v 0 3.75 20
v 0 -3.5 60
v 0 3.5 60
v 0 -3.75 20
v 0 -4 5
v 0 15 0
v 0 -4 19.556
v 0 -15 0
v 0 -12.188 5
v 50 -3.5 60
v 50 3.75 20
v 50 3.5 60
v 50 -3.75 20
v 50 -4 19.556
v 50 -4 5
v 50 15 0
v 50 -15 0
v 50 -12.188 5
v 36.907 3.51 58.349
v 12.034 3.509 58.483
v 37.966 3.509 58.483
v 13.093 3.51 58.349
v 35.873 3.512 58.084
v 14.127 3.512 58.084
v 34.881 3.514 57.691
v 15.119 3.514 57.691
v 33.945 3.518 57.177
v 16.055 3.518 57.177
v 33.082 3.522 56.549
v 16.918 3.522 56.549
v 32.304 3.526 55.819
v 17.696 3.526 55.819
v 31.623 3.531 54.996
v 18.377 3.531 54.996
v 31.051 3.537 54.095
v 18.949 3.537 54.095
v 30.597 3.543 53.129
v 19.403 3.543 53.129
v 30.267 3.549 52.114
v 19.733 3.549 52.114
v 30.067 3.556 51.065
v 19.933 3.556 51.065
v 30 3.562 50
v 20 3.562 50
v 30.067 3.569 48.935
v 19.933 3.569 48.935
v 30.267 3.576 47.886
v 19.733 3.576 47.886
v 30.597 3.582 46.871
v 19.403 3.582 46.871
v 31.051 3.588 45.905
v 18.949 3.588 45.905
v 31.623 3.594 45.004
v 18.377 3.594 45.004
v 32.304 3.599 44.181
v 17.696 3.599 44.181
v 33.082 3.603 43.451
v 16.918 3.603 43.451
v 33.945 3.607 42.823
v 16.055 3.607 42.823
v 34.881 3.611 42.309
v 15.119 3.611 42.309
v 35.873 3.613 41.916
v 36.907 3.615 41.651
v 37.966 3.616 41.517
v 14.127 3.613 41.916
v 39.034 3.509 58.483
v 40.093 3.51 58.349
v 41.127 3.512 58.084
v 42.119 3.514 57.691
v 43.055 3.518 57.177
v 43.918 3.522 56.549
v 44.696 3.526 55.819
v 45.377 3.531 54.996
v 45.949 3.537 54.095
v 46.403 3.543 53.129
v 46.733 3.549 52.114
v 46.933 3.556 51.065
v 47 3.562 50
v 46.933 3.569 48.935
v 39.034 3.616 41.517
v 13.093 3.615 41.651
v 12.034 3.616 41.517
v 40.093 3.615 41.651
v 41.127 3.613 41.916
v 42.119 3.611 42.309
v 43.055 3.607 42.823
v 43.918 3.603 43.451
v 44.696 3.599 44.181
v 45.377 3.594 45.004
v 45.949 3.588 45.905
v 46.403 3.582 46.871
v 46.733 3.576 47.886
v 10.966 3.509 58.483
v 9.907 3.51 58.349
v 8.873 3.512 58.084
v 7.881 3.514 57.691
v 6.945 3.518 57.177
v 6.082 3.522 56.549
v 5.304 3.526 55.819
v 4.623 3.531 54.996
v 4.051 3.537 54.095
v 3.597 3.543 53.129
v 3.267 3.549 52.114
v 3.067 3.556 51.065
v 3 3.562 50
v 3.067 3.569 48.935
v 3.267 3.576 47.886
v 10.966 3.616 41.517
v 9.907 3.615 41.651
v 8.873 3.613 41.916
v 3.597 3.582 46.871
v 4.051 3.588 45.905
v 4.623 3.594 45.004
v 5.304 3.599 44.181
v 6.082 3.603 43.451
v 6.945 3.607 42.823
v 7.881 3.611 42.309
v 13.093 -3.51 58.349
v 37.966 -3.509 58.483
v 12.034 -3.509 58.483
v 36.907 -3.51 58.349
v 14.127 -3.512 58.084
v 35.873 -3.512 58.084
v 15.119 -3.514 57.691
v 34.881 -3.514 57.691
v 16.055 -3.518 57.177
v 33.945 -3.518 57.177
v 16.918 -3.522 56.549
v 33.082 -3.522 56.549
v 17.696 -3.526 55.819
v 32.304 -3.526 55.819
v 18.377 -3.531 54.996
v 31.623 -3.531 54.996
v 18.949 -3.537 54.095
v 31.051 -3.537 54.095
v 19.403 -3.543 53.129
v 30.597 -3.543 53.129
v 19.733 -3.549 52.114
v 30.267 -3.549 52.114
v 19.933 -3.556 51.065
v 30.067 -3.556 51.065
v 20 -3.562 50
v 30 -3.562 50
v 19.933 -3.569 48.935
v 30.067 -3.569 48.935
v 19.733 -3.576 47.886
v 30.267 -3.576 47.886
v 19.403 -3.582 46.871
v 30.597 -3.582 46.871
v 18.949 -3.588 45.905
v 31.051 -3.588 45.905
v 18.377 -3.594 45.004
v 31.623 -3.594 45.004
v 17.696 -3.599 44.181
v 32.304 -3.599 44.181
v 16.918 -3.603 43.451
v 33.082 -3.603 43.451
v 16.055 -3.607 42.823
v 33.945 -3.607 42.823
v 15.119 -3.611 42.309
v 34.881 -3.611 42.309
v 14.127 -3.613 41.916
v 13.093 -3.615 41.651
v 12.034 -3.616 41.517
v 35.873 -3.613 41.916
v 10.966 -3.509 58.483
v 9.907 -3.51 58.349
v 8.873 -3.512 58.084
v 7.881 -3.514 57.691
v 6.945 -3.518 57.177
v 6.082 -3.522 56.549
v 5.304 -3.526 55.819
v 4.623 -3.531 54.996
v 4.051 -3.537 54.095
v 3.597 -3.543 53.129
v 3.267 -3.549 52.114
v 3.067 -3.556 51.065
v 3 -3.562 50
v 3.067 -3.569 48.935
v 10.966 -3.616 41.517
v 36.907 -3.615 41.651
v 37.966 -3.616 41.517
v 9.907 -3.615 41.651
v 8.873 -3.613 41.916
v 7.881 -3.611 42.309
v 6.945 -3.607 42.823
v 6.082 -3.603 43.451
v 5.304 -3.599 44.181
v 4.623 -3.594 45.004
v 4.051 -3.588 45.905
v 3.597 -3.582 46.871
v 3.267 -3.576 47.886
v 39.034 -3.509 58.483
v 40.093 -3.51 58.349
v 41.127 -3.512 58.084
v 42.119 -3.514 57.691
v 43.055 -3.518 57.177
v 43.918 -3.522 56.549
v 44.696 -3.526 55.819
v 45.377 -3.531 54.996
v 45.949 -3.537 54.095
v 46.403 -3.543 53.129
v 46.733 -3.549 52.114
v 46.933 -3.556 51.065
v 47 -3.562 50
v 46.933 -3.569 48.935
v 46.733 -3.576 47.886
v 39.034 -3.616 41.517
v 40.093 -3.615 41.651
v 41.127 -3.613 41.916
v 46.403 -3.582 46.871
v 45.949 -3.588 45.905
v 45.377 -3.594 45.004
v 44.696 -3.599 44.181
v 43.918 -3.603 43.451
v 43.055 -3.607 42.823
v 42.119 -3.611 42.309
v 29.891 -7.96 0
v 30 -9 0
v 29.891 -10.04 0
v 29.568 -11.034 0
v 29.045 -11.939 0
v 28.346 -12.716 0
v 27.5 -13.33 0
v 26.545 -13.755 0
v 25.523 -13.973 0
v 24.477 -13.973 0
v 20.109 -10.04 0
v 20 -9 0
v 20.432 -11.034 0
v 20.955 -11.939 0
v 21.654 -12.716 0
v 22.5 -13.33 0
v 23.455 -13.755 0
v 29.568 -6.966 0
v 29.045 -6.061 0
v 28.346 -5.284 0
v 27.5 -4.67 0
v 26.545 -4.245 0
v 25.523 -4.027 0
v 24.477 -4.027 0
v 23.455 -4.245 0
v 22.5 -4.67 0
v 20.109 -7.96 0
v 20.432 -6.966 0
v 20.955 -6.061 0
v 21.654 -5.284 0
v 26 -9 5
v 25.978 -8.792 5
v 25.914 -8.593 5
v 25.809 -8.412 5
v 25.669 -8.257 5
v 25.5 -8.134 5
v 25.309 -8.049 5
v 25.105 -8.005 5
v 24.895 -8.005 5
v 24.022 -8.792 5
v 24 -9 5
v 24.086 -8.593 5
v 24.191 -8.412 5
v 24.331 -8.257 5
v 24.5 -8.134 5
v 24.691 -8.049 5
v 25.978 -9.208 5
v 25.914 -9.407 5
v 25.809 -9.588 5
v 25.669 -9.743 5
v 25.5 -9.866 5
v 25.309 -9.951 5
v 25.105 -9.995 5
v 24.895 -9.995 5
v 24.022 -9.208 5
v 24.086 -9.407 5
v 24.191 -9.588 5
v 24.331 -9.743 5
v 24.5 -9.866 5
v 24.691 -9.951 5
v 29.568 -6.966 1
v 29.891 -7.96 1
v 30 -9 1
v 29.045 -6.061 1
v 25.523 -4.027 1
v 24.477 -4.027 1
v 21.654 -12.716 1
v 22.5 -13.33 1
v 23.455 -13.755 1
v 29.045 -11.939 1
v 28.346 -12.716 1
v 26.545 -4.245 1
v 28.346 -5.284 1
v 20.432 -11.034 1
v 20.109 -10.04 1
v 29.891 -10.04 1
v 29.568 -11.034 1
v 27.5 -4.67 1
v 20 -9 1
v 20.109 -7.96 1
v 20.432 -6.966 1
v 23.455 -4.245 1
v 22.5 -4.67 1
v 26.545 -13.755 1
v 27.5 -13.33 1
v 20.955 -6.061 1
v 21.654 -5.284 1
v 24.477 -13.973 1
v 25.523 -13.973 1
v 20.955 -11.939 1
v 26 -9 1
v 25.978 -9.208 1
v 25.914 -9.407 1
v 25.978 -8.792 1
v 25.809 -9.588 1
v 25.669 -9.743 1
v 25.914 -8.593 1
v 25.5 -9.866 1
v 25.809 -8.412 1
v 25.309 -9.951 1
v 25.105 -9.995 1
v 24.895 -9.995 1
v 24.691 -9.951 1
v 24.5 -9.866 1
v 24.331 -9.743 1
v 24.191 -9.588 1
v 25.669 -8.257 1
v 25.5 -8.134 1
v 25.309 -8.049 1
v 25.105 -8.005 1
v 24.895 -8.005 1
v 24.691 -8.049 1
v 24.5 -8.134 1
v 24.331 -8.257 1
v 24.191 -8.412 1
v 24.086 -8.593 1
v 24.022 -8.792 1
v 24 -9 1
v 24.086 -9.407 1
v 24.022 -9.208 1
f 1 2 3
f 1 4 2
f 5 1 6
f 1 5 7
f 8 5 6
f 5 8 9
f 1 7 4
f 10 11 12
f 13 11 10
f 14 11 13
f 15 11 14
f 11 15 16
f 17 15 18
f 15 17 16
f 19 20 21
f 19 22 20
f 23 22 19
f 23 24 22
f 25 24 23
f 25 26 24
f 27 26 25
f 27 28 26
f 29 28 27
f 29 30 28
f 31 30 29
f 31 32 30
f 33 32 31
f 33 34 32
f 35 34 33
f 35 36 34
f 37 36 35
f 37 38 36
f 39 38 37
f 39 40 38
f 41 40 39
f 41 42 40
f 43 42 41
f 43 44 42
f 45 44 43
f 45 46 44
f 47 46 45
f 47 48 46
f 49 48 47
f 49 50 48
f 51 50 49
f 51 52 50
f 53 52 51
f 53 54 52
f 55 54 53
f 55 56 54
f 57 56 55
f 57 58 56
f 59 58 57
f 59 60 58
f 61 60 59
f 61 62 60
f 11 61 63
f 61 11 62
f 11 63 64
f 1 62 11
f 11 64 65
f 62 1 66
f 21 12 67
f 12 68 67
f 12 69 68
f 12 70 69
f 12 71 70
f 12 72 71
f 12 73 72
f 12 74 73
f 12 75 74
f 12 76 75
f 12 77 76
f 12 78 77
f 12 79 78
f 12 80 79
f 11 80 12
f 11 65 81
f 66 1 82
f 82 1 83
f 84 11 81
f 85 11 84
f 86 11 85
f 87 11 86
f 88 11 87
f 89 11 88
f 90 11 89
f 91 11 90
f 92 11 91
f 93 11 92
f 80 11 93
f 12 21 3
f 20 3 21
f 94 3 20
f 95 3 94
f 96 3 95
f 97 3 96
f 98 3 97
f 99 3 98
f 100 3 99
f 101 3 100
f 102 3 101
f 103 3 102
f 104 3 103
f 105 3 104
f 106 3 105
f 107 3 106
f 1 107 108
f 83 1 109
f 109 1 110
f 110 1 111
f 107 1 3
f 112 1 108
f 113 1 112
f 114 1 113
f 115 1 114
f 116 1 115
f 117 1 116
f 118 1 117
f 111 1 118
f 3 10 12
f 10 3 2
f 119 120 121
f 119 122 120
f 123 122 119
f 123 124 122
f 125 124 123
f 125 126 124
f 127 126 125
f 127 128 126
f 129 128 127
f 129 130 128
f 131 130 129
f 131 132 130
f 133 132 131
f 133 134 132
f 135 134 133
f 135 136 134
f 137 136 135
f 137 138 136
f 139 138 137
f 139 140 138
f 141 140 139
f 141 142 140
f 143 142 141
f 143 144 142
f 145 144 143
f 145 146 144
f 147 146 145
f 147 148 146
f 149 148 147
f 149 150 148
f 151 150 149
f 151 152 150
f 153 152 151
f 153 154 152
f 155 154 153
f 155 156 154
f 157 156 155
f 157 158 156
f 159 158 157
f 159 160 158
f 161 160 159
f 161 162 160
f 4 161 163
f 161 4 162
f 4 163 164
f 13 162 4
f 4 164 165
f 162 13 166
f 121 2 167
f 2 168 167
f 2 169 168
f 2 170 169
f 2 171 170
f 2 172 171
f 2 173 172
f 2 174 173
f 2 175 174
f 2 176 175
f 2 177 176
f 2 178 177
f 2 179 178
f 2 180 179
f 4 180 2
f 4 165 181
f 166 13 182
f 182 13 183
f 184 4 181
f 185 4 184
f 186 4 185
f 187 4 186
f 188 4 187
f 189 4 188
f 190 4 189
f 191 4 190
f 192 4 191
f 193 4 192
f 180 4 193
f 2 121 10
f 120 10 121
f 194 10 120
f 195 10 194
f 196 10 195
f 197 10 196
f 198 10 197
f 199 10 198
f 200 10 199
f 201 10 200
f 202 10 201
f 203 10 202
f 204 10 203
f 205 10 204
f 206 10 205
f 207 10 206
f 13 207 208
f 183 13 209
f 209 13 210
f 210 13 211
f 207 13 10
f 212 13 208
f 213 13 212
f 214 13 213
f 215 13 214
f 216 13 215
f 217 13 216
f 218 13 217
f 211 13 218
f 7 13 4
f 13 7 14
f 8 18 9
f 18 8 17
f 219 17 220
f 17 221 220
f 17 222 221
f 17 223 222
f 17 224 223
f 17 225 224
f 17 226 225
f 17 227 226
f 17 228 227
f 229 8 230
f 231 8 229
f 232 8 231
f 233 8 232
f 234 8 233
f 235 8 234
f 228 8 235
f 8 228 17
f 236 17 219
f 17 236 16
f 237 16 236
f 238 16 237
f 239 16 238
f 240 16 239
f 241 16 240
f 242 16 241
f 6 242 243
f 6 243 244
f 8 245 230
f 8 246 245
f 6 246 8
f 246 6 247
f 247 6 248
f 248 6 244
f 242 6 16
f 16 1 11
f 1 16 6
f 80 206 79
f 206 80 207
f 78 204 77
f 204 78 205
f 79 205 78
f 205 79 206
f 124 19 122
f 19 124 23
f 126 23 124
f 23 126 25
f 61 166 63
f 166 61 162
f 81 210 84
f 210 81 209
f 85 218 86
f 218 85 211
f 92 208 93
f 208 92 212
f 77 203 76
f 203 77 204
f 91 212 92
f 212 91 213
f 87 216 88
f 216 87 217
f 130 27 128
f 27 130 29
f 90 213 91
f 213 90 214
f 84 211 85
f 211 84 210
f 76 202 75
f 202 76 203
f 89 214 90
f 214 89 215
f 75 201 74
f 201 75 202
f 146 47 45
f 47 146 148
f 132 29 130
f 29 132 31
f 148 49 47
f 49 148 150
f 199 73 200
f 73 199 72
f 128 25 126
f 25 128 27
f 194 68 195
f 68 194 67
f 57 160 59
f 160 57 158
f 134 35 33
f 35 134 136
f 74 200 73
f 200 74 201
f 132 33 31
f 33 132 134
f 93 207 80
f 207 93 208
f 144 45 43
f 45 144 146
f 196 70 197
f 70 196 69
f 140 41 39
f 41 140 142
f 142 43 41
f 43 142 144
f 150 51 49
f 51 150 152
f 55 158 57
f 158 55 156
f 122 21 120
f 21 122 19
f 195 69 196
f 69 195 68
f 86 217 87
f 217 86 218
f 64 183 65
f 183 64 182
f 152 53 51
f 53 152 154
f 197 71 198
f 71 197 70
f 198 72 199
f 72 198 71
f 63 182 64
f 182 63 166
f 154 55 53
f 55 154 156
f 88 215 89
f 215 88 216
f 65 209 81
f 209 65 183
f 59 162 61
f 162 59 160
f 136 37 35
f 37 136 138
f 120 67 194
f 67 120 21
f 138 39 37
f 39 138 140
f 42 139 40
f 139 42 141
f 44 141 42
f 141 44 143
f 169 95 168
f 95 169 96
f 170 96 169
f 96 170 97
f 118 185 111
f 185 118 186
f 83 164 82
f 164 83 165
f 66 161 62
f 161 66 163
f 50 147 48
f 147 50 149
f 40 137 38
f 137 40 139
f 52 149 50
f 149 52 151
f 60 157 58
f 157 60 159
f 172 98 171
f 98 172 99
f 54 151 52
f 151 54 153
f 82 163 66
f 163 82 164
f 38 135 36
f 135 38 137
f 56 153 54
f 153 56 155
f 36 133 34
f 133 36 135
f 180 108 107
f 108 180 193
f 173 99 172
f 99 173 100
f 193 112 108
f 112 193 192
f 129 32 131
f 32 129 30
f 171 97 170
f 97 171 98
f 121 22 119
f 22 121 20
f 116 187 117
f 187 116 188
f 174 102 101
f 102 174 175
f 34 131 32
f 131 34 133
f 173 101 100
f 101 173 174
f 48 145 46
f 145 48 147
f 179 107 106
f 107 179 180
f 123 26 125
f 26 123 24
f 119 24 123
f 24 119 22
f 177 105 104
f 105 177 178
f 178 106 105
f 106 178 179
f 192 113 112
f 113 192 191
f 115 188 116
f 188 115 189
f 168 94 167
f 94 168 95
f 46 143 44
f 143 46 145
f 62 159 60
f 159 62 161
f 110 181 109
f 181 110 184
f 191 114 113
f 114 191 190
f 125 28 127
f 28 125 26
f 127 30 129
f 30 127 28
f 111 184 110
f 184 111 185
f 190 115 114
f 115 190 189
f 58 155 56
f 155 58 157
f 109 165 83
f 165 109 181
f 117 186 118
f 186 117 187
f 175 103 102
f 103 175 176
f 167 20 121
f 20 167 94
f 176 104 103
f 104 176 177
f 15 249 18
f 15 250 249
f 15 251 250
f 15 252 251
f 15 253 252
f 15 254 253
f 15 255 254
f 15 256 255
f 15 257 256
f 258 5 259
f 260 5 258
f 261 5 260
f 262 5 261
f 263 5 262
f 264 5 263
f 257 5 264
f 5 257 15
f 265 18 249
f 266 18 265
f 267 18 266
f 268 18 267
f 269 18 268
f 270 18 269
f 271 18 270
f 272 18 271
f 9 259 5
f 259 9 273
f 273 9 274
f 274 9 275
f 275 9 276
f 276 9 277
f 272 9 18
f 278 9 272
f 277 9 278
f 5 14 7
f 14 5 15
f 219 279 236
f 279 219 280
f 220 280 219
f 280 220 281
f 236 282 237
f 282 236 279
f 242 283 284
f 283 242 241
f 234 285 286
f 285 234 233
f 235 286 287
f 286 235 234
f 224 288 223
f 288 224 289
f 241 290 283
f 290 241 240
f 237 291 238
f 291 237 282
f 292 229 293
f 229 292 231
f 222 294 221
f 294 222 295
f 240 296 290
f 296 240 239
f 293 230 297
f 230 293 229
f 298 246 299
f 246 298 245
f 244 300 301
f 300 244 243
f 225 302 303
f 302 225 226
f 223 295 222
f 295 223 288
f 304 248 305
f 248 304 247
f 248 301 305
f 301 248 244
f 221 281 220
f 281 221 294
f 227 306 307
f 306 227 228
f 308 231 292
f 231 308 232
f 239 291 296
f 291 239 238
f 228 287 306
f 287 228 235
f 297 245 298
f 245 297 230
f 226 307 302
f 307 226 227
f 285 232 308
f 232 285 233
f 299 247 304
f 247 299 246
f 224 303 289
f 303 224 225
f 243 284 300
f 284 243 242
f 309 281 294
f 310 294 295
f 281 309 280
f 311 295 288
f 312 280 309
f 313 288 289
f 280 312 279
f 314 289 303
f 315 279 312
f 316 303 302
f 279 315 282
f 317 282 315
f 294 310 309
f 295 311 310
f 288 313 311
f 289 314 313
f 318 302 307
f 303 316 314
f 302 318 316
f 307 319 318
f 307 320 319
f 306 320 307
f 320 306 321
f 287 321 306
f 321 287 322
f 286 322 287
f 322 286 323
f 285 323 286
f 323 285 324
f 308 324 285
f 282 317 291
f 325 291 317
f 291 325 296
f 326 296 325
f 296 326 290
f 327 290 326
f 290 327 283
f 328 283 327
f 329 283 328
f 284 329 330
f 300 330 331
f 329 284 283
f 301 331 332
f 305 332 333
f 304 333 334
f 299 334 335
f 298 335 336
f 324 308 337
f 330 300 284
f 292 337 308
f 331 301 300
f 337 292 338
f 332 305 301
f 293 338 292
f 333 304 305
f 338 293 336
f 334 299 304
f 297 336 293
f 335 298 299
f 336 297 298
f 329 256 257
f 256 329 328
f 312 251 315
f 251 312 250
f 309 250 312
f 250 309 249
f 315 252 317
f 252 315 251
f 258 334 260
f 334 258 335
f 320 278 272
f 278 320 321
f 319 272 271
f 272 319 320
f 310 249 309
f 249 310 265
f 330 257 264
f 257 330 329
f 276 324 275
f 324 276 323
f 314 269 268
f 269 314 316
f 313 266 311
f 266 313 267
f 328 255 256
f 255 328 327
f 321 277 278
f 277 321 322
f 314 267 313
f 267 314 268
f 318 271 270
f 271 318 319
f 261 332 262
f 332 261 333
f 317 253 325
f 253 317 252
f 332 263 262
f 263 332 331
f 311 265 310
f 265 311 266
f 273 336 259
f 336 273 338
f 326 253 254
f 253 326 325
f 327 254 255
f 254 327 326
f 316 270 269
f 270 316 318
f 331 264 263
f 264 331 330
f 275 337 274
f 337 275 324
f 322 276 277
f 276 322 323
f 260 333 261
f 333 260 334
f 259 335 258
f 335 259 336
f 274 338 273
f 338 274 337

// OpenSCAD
h=20;
diamc=17;
X=45;
B=15;
b=7;
h=40;
module piezabase(){
translate([0, 0, 20])
difference(){
translate([25, 0, 0])
translate([0, 0, 20])
rotate([90, 0, 90])
linear_extrude(height=50, center=true)
polygon(points=[
    [-B/4, -h/2],
    [-b/2, h/2],
    [b/2, h/2],
    [B/4, -h/2],
    [B, -h],
    [-B, -h],
    ]);

translate([38.5, 25, 30])
rotate([90, 0, 0])
cylinder(r=diamc/2, h=50, $fn=50);

translate([11.5, 25, 30])
rotate([90, 0, 0])
cylinder(r=diamc/2, h=50, $fn=50);
}
}

module piezacorte(){
difference(){
piezabase();
translate([-10, -19, 5])
cube([70, 15, 20]);
}
}

module piezaserv(){
difference(){
piezacorte();
translate([25, -9, -1])
cylinder(r=5, h=2,$fn=30);
}
}

module piezafin(){
difference(){
piezaserv();
translate([25, -9, -10])
cylinder(r=1, h=40,$fn=30);
}
}

piezafin();
